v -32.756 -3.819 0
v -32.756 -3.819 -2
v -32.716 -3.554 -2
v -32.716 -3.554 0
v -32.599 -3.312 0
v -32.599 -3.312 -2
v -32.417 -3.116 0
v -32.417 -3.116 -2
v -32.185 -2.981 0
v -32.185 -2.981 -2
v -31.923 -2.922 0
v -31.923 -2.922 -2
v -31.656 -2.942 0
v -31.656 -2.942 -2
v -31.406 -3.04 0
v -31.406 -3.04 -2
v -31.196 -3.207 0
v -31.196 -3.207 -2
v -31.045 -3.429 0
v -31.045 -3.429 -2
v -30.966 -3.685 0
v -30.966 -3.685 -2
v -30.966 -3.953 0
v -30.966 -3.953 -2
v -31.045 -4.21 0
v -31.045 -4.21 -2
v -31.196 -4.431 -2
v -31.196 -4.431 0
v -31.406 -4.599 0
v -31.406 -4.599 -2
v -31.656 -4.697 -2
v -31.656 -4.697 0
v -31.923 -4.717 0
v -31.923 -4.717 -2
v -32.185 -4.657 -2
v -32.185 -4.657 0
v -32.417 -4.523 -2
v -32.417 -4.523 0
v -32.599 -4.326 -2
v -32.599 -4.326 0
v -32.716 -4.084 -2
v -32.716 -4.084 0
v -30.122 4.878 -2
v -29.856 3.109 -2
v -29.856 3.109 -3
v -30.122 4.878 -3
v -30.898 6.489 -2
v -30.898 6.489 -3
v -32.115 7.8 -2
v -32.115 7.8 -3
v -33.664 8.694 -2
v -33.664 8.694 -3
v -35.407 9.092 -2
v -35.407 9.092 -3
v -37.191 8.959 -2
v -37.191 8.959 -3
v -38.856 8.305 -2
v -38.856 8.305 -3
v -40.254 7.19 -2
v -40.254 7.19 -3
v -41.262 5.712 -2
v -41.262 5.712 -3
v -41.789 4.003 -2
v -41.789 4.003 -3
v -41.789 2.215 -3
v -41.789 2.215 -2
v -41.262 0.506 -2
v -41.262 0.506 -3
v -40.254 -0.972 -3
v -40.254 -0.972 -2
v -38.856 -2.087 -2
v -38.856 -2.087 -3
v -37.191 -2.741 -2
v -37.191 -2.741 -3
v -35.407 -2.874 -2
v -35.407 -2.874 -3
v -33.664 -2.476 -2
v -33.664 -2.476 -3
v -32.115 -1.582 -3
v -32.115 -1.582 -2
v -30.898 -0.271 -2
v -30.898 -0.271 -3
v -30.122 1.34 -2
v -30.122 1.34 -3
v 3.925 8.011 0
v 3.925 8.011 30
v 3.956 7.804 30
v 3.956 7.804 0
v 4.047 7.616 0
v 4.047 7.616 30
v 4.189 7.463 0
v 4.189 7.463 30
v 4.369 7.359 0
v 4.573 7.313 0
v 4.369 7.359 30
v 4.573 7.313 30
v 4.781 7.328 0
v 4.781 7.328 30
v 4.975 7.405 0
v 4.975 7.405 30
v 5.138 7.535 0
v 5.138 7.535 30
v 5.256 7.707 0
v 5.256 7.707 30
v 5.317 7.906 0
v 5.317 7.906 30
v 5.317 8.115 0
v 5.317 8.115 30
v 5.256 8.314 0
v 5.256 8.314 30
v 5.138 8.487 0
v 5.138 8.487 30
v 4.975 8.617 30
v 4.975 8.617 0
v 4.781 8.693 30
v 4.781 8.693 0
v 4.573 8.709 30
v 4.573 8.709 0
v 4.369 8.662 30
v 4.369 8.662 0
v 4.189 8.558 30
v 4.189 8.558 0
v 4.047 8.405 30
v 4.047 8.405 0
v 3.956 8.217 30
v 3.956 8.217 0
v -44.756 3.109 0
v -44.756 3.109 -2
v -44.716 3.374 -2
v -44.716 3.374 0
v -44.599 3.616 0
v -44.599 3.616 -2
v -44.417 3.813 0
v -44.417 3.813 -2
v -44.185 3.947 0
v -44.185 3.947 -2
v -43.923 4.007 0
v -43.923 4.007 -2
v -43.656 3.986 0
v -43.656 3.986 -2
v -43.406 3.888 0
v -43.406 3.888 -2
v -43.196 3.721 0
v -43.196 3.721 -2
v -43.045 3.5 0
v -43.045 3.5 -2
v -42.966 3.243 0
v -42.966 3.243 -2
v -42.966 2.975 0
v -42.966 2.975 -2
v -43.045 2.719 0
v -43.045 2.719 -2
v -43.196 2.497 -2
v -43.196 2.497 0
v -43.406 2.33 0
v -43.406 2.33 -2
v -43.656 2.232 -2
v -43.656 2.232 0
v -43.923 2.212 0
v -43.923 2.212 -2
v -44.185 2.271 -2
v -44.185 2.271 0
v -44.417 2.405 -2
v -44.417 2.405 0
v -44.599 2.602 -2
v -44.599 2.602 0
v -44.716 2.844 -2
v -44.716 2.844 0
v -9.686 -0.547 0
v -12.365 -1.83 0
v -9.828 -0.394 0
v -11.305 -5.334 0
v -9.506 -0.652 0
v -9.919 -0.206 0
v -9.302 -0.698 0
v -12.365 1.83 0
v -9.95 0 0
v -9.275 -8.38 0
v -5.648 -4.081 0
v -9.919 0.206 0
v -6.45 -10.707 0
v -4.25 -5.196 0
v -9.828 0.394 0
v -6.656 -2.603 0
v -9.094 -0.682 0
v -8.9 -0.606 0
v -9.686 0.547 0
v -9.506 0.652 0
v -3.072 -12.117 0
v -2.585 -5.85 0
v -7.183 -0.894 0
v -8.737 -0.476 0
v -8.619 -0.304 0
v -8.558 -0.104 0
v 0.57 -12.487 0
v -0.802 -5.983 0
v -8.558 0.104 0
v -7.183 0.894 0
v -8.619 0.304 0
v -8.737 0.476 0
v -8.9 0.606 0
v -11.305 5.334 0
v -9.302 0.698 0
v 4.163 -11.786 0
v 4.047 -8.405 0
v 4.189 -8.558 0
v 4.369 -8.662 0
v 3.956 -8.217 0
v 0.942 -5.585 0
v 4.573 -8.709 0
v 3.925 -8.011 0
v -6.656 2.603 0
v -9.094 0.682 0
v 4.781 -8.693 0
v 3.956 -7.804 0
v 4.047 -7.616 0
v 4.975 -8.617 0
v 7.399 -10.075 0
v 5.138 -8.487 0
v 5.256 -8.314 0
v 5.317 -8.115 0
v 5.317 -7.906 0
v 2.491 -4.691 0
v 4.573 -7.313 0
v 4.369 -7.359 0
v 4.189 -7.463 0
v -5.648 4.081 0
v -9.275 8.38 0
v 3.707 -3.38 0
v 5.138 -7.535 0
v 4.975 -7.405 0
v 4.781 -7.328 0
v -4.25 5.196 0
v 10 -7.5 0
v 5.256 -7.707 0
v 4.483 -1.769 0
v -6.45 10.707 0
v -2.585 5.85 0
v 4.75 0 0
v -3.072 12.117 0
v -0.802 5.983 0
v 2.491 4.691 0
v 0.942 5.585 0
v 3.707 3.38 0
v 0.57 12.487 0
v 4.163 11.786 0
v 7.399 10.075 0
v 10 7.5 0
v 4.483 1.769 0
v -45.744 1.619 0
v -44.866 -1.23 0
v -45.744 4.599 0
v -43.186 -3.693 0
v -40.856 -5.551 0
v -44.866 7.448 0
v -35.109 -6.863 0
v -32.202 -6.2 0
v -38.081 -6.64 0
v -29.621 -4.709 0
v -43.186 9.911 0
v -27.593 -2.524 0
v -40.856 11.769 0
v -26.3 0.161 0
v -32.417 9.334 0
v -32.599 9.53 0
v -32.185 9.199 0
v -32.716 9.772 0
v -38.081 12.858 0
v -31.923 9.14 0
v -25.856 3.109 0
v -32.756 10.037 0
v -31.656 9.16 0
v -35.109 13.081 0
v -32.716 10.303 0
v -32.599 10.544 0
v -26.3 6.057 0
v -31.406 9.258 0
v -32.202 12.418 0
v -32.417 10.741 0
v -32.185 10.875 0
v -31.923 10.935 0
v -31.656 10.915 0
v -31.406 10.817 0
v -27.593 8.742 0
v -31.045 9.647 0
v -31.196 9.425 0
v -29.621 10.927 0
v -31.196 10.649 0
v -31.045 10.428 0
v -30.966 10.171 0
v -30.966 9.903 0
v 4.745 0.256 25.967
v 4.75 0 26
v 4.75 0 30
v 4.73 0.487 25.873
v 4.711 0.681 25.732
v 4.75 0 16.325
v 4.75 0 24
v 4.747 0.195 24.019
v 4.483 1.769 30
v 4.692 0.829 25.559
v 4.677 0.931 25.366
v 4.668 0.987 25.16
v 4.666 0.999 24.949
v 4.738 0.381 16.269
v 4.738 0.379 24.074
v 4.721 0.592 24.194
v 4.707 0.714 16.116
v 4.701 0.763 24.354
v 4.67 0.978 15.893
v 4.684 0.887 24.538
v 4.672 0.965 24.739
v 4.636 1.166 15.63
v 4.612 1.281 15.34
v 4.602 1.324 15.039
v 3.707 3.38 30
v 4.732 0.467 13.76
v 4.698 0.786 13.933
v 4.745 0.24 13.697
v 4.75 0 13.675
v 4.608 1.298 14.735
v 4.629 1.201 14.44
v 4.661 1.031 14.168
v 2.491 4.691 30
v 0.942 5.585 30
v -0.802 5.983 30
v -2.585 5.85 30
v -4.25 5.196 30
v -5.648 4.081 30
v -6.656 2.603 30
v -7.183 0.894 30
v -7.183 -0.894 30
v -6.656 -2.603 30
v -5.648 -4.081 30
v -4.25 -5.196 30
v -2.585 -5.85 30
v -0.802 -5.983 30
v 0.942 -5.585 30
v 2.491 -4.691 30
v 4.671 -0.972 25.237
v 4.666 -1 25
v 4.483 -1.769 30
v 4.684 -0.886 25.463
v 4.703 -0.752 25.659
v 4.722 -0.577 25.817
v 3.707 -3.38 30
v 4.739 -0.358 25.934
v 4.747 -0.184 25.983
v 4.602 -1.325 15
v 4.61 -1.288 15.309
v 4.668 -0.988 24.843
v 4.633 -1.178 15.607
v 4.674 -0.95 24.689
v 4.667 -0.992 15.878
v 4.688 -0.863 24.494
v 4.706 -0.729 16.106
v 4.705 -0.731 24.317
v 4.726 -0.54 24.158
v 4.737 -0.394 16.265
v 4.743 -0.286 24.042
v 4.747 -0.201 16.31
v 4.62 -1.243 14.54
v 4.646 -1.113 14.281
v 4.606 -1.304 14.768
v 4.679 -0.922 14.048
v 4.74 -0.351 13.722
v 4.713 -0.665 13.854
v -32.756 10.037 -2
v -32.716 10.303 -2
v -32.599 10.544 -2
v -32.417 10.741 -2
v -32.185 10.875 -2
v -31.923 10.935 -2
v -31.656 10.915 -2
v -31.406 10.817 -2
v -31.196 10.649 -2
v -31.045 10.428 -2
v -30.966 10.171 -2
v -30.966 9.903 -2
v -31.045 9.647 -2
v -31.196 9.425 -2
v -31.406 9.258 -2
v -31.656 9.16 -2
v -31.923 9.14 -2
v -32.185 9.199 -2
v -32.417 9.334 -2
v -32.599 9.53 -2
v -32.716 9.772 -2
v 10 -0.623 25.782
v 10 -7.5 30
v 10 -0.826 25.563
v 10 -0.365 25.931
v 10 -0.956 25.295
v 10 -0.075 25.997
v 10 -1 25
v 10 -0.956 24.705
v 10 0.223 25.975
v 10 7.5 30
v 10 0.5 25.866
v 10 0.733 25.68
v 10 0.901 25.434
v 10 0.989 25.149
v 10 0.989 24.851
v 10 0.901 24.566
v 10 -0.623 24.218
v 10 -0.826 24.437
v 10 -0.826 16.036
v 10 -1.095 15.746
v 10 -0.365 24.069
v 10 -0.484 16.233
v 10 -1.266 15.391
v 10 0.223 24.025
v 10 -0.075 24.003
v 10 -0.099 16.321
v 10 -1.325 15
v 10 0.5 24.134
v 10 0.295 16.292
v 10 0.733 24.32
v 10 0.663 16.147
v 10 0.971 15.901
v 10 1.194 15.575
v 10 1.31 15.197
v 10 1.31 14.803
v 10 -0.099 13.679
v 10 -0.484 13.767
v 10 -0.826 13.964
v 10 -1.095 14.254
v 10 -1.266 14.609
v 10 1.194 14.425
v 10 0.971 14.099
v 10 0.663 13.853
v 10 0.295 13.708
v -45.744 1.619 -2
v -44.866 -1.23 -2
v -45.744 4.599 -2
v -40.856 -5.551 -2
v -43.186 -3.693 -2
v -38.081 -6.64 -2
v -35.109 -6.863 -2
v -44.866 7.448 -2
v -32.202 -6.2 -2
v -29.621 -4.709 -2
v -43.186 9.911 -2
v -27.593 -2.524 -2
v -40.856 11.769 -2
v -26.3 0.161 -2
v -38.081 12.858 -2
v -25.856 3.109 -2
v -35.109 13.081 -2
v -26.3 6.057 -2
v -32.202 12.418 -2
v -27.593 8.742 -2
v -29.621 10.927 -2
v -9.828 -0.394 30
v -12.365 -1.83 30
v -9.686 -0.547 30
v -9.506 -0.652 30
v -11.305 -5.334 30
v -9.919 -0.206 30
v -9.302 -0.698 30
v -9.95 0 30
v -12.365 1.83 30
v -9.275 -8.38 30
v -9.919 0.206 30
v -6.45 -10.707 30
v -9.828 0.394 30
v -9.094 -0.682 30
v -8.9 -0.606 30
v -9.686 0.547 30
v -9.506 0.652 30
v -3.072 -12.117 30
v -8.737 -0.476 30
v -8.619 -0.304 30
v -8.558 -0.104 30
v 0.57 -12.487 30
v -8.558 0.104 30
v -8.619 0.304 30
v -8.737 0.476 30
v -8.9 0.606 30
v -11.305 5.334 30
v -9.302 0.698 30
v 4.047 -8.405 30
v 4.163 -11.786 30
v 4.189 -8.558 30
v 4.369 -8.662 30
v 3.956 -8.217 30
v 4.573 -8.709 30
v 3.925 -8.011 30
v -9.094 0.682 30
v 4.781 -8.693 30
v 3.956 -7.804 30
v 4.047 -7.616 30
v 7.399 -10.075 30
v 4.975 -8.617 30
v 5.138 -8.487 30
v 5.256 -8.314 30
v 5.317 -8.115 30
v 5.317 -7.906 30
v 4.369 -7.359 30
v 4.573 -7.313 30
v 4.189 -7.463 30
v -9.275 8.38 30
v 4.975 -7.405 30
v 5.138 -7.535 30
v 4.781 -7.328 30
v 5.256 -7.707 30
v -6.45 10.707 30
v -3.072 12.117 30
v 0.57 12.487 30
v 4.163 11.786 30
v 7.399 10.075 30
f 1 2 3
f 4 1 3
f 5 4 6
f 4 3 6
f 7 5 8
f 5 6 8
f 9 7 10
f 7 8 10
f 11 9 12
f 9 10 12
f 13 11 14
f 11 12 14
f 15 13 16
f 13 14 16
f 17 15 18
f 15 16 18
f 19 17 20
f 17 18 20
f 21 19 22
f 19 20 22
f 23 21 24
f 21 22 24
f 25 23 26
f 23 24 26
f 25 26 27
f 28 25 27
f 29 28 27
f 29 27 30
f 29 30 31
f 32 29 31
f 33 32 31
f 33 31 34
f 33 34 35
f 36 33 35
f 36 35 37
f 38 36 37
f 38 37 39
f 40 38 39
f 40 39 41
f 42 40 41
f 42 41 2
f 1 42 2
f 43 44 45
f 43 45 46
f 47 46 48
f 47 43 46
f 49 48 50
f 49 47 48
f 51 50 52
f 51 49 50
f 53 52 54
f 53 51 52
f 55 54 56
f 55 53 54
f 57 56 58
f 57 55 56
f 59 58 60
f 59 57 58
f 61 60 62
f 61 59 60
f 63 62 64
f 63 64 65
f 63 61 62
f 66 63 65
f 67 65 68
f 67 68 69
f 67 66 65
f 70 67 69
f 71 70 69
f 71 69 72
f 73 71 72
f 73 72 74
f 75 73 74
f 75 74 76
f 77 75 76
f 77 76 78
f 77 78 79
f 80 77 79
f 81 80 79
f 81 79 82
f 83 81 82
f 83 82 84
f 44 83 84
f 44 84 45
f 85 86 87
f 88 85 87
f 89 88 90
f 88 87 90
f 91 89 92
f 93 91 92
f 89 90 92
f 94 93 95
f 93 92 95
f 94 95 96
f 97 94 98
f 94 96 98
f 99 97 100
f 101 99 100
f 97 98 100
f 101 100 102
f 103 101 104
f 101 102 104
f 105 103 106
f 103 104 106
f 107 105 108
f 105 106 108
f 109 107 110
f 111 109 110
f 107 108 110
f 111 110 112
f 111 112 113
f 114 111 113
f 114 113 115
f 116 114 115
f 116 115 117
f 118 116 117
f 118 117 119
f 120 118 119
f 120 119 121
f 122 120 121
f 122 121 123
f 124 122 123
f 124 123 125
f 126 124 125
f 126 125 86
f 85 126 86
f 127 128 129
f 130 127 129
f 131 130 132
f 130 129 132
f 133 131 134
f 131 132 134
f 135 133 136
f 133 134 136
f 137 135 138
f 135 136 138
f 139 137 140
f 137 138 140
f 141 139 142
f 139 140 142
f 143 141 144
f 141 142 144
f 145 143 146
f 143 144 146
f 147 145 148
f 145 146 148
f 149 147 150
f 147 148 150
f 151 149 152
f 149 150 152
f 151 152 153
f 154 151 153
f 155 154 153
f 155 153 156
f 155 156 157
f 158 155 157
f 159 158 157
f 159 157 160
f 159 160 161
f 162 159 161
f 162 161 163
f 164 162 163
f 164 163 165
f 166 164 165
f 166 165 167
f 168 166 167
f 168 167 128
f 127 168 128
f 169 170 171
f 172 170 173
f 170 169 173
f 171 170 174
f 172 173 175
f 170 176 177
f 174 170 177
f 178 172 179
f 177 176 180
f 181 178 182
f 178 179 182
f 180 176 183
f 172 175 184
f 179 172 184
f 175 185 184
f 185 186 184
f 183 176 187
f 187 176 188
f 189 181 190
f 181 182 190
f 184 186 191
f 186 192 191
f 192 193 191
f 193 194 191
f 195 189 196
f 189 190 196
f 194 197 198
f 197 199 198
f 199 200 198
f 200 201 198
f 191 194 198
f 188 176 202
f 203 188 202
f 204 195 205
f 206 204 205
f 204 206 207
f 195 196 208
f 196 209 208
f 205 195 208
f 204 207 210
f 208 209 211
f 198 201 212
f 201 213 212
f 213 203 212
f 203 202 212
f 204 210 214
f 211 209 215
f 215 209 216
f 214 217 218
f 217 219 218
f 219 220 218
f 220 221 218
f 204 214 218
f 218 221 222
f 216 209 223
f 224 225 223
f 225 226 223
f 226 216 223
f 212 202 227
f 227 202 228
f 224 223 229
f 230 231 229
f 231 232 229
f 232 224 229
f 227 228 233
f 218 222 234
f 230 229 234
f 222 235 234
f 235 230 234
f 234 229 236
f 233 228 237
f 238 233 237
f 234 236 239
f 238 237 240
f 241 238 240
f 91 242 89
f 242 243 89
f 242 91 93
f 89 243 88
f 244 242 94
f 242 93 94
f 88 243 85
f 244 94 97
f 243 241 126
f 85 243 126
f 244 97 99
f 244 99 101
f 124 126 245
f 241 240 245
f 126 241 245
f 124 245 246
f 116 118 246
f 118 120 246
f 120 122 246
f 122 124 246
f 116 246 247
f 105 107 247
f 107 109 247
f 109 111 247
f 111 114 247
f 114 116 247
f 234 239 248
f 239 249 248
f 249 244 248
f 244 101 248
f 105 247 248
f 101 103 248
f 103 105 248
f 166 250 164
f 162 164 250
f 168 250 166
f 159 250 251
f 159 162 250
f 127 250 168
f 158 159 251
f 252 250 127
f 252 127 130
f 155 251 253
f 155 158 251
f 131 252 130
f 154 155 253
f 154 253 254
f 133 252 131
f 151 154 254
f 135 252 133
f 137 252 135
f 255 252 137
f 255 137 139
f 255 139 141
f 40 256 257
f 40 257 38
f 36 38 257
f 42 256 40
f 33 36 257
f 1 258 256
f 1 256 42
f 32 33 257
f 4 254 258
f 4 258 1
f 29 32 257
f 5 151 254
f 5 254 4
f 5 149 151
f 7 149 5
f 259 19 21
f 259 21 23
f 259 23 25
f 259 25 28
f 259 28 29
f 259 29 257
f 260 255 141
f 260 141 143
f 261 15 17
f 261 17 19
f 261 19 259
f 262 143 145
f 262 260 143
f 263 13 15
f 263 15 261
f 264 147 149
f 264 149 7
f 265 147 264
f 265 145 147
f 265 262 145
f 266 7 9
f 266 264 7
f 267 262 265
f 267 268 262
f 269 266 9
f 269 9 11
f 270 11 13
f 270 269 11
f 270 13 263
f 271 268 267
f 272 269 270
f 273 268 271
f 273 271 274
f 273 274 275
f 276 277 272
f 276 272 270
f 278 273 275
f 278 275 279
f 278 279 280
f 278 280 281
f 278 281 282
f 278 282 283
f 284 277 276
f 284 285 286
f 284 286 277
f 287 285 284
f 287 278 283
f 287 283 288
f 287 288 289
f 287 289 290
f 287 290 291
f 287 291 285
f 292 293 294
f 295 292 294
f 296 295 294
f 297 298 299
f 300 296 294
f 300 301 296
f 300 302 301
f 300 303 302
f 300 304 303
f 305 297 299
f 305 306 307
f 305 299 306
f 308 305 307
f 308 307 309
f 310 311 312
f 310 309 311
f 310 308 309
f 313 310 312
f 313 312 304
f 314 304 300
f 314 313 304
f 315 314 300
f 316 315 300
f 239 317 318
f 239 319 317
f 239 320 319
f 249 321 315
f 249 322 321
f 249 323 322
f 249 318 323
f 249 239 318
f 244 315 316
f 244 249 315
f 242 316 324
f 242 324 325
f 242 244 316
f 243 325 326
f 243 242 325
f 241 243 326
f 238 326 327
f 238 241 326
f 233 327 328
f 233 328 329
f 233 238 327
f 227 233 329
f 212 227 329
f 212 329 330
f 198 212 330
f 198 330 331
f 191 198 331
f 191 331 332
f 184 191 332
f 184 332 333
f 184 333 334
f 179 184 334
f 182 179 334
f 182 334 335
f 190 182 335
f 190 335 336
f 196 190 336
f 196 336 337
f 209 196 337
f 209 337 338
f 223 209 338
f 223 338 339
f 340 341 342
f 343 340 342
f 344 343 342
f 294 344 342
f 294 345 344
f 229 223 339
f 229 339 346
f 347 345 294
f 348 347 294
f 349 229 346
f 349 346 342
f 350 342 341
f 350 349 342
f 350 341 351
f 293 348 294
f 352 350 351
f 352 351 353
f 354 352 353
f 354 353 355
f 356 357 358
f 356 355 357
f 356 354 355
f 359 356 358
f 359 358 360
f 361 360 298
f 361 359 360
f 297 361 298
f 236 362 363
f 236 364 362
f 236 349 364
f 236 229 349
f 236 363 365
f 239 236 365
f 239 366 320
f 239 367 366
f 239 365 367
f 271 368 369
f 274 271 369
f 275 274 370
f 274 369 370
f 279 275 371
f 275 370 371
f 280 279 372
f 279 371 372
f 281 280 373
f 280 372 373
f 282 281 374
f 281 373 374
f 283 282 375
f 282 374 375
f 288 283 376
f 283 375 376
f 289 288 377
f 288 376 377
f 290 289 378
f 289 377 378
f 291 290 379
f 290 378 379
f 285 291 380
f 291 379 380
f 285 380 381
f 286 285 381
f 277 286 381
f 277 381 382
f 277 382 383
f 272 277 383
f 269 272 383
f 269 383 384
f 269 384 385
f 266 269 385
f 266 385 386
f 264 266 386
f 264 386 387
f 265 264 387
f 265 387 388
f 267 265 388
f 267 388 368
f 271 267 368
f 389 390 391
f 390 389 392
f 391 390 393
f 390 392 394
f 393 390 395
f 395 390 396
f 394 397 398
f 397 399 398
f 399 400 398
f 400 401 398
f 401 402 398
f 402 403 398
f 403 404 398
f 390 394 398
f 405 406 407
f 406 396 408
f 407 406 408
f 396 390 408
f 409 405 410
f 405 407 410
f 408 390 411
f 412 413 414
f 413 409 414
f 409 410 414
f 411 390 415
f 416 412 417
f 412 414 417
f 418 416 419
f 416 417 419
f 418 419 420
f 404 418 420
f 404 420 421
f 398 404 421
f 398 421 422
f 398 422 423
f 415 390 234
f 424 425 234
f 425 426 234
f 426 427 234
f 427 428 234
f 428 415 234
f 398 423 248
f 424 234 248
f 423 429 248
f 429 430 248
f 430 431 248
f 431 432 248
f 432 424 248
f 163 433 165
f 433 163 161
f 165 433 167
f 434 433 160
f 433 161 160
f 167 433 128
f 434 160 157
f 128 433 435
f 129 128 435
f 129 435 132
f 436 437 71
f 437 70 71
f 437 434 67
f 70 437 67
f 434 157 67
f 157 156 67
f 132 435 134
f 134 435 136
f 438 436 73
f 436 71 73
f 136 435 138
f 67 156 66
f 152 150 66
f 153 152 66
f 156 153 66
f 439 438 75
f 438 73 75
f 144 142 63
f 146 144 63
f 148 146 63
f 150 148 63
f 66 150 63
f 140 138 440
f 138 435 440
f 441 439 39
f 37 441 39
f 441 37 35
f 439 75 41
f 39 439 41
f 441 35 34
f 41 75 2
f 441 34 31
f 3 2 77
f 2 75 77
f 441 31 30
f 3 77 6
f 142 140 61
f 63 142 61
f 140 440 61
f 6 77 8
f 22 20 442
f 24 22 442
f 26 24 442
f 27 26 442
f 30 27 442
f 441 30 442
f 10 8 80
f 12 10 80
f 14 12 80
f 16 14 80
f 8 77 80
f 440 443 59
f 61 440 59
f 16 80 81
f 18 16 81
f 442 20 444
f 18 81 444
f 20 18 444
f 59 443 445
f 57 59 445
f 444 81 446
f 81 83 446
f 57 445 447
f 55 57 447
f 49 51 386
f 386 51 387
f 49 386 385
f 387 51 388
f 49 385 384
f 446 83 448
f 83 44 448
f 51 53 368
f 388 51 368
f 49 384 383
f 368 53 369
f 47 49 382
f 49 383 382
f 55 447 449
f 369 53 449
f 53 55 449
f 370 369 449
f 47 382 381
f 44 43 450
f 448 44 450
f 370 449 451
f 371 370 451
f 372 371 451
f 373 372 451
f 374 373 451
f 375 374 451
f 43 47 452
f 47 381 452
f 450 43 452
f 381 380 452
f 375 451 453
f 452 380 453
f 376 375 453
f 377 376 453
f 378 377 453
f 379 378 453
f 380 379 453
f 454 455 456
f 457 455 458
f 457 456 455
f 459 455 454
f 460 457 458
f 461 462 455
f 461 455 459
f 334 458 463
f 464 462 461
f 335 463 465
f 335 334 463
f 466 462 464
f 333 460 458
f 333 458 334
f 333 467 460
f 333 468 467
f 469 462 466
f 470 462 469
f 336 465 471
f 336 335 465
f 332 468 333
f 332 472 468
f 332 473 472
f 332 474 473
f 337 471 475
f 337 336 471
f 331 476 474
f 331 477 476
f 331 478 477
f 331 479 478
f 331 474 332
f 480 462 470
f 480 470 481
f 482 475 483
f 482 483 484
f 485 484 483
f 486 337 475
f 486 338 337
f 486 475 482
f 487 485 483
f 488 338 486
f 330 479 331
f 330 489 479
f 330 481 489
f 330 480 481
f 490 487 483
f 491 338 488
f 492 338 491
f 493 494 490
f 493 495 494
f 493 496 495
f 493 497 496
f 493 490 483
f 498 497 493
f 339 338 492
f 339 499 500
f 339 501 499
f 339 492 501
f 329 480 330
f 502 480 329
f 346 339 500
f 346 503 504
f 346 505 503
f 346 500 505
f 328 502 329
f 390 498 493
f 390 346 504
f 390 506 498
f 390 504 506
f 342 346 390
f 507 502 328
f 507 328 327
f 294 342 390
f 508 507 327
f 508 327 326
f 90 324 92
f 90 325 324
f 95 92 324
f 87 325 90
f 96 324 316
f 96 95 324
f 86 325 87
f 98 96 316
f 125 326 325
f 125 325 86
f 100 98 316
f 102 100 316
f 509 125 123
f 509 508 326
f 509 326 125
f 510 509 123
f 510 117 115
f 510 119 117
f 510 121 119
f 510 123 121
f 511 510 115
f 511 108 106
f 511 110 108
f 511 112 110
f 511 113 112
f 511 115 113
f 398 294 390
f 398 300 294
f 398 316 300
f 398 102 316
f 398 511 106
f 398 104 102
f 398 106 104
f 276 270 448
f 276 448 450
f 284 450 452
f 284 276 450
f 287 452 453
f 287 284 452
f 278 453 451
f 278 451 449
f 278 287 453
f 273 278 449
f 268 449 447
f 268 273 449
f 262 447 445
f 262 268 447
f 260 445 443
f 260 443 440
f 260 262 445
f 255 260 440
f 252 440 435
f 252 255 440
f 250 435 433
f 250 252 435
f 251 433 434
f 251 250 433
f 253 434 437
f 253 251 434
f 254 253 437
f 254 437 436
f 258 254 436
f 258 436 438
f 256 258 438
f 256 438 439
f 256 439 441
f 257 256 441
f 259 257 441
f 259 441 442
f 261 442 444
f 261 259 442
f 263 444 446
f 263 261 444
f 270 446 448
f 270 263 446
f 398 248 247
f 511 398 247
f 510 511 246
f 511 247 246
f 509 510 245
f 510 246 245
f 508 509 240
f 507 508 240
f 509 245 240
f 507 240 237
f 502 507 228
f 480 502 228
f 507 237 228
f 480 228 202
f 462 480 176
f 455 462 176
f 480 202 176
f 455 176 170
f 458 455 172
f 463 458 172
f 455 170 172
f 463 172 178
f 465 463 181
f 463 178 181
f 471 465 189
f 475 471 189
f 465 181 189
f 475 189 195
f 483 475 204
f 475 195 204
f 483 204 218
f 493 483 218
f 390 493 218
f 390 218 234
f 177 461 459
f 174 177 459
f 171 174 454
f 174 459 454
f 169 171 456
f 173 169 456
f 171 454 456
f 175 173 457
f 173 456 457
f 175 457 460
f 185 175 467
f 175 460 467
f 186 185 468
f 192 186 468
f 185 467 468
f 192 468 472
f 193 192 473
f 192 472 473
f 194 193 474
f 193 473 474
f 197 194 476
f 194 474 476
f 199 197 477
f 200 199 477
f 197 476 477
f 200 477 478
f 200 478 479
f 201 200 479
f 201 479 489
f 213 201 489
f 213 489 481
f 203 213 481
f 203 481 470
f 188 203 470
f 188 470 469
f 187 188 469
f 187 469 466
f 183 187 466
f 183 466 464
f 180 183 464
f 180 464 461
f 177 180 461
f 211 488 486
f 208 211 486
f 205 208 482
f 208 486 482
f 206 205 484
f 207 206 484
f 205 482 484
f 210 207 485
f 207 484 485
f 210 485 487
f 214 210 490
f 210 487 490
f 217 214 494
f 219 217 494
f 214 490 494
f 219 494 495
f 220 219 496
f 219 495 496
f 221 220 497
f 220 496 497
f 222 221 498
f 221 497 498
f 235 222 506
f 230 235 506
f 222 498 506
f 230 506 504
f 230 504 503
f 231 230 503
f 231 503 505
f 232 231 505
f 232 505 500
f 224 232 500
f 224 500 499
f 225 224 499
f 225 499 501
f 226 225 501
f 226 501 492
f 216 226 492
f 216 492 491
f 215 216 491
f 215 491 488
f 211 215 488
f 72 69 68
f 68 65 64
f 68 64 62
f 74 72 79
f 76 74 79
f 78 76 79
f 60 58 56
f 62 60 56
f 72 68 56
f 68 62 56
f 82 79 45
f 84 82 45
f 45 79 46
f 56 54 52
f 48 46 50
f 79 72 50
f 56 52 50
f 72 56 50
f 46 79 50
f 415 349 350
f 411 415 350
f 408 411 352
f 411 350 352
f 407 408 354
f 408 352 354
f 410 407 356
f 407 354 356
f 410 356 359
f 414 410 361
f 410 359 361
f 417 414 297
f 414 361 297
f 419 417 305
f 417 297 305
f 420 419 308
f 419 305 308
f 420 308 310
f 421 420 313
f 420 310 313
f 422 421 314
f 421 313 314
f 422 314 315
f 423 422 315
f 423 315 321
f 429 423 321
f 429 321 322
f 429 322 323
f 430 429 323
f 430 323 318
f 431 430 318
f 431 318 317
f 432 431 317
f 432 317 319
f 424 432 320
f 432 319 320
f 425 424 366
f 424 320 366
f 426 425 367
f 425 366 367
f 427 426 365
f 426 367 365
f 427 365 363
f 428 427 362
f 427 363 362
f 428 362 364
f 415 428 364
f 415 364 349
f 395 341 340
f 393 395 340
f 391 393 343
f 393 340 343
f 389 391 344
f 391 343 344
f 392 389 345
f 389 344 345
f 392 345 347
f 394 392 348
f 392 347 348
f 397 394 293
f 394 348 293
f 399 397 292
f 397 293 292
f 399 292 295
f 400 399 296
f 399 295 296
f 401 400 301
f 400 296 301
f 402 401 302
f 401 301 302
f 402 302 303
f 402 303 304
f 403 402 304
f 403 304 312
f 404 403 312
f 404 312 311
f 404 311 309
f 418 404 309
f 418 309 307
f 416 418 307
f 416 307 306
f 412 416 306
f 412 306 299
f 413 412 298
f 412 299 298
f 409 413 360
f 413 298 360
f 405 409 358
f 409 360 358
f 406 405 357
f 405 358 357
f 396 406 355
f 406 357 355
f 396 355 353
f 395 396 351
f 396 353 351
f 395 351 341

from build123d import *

# Parameters (mm, degrees)
F0_R     = 6
F1_DEPTH = 30
F2_D     = 1.4
F4_D     = 2.65
F4_DEPTH = 10
F5_D     = 2
F5_DEPTH = 10
F6_R     = 10
F6_R_2   = 6
F7_DEPTH = 2
F8_DEPTH = 3
F9_D     = 1.8


with BuildPart() as f1:
    # F0 (on Top) → F1 (new body)
    with BuildSketch(Plane.XY):
        with BuildLine():
            Line((10, -7.5), (10, 7.5))
            ThreePointArc((10, 7.5), (-12.5, 0), (10, -7.5))
        make_face()
        with Locations((-1.25, 0)):
            Circle(F0_R, mode=Mode.SUBTRACT)
    extrude(amount=F1_DEPTH)

    # F2 (through all)
    with Locations(Plane(origin=(0, 0, 0), x_dir=(1, 0, 0), z_dir=(0, 0, -1))):
        with Locations((-9.25, 0), (4.625, 8.010735), (4.625, -8.010735)):
            Hole(F2_D / 2)

    # F4
    with Locations(Plane.YZ.offset(10)):
        with Locations((0, 15)):
            Hole(F4_D / 2, depth=F4_DEPTH)

    # F5
    with Locations(Plane.YZ.offset(10)):
        with Locations((0, 25)):
            Hole(F5_D / 2, depth=F5_DEPTH)


with BuildPart() as f7:
    # F6 (on face) → F7 (new body)
    with BuildSketch(Plane.XY):
        with Locations((-35.855876, 3.109021)):
            Circle(F6_R)
        with Locations((-35.855876, 3.109021)):
            Circle(F6_R_2, mode=Mode.SUBTRACT)
    extrude(amount=-F7_DEPTH)

    # F6 (on face) → F8 (join)
    with BuildSketch(Plane.XY):
        with Locations((-35.855876, 3.109021)):
            Circle(F6_R_2)
    extrude(amount=-F8_DEPTH)

    # F9 (through all)
    with Locations(Plane.XY):
        with Locations((-31.855876, 10.037224), (-43.855876, 3.109021), (-31.855876, -3.819182)):
            Hole(F9_D / 2)


solid = Compound([f1.part, f7.part])
